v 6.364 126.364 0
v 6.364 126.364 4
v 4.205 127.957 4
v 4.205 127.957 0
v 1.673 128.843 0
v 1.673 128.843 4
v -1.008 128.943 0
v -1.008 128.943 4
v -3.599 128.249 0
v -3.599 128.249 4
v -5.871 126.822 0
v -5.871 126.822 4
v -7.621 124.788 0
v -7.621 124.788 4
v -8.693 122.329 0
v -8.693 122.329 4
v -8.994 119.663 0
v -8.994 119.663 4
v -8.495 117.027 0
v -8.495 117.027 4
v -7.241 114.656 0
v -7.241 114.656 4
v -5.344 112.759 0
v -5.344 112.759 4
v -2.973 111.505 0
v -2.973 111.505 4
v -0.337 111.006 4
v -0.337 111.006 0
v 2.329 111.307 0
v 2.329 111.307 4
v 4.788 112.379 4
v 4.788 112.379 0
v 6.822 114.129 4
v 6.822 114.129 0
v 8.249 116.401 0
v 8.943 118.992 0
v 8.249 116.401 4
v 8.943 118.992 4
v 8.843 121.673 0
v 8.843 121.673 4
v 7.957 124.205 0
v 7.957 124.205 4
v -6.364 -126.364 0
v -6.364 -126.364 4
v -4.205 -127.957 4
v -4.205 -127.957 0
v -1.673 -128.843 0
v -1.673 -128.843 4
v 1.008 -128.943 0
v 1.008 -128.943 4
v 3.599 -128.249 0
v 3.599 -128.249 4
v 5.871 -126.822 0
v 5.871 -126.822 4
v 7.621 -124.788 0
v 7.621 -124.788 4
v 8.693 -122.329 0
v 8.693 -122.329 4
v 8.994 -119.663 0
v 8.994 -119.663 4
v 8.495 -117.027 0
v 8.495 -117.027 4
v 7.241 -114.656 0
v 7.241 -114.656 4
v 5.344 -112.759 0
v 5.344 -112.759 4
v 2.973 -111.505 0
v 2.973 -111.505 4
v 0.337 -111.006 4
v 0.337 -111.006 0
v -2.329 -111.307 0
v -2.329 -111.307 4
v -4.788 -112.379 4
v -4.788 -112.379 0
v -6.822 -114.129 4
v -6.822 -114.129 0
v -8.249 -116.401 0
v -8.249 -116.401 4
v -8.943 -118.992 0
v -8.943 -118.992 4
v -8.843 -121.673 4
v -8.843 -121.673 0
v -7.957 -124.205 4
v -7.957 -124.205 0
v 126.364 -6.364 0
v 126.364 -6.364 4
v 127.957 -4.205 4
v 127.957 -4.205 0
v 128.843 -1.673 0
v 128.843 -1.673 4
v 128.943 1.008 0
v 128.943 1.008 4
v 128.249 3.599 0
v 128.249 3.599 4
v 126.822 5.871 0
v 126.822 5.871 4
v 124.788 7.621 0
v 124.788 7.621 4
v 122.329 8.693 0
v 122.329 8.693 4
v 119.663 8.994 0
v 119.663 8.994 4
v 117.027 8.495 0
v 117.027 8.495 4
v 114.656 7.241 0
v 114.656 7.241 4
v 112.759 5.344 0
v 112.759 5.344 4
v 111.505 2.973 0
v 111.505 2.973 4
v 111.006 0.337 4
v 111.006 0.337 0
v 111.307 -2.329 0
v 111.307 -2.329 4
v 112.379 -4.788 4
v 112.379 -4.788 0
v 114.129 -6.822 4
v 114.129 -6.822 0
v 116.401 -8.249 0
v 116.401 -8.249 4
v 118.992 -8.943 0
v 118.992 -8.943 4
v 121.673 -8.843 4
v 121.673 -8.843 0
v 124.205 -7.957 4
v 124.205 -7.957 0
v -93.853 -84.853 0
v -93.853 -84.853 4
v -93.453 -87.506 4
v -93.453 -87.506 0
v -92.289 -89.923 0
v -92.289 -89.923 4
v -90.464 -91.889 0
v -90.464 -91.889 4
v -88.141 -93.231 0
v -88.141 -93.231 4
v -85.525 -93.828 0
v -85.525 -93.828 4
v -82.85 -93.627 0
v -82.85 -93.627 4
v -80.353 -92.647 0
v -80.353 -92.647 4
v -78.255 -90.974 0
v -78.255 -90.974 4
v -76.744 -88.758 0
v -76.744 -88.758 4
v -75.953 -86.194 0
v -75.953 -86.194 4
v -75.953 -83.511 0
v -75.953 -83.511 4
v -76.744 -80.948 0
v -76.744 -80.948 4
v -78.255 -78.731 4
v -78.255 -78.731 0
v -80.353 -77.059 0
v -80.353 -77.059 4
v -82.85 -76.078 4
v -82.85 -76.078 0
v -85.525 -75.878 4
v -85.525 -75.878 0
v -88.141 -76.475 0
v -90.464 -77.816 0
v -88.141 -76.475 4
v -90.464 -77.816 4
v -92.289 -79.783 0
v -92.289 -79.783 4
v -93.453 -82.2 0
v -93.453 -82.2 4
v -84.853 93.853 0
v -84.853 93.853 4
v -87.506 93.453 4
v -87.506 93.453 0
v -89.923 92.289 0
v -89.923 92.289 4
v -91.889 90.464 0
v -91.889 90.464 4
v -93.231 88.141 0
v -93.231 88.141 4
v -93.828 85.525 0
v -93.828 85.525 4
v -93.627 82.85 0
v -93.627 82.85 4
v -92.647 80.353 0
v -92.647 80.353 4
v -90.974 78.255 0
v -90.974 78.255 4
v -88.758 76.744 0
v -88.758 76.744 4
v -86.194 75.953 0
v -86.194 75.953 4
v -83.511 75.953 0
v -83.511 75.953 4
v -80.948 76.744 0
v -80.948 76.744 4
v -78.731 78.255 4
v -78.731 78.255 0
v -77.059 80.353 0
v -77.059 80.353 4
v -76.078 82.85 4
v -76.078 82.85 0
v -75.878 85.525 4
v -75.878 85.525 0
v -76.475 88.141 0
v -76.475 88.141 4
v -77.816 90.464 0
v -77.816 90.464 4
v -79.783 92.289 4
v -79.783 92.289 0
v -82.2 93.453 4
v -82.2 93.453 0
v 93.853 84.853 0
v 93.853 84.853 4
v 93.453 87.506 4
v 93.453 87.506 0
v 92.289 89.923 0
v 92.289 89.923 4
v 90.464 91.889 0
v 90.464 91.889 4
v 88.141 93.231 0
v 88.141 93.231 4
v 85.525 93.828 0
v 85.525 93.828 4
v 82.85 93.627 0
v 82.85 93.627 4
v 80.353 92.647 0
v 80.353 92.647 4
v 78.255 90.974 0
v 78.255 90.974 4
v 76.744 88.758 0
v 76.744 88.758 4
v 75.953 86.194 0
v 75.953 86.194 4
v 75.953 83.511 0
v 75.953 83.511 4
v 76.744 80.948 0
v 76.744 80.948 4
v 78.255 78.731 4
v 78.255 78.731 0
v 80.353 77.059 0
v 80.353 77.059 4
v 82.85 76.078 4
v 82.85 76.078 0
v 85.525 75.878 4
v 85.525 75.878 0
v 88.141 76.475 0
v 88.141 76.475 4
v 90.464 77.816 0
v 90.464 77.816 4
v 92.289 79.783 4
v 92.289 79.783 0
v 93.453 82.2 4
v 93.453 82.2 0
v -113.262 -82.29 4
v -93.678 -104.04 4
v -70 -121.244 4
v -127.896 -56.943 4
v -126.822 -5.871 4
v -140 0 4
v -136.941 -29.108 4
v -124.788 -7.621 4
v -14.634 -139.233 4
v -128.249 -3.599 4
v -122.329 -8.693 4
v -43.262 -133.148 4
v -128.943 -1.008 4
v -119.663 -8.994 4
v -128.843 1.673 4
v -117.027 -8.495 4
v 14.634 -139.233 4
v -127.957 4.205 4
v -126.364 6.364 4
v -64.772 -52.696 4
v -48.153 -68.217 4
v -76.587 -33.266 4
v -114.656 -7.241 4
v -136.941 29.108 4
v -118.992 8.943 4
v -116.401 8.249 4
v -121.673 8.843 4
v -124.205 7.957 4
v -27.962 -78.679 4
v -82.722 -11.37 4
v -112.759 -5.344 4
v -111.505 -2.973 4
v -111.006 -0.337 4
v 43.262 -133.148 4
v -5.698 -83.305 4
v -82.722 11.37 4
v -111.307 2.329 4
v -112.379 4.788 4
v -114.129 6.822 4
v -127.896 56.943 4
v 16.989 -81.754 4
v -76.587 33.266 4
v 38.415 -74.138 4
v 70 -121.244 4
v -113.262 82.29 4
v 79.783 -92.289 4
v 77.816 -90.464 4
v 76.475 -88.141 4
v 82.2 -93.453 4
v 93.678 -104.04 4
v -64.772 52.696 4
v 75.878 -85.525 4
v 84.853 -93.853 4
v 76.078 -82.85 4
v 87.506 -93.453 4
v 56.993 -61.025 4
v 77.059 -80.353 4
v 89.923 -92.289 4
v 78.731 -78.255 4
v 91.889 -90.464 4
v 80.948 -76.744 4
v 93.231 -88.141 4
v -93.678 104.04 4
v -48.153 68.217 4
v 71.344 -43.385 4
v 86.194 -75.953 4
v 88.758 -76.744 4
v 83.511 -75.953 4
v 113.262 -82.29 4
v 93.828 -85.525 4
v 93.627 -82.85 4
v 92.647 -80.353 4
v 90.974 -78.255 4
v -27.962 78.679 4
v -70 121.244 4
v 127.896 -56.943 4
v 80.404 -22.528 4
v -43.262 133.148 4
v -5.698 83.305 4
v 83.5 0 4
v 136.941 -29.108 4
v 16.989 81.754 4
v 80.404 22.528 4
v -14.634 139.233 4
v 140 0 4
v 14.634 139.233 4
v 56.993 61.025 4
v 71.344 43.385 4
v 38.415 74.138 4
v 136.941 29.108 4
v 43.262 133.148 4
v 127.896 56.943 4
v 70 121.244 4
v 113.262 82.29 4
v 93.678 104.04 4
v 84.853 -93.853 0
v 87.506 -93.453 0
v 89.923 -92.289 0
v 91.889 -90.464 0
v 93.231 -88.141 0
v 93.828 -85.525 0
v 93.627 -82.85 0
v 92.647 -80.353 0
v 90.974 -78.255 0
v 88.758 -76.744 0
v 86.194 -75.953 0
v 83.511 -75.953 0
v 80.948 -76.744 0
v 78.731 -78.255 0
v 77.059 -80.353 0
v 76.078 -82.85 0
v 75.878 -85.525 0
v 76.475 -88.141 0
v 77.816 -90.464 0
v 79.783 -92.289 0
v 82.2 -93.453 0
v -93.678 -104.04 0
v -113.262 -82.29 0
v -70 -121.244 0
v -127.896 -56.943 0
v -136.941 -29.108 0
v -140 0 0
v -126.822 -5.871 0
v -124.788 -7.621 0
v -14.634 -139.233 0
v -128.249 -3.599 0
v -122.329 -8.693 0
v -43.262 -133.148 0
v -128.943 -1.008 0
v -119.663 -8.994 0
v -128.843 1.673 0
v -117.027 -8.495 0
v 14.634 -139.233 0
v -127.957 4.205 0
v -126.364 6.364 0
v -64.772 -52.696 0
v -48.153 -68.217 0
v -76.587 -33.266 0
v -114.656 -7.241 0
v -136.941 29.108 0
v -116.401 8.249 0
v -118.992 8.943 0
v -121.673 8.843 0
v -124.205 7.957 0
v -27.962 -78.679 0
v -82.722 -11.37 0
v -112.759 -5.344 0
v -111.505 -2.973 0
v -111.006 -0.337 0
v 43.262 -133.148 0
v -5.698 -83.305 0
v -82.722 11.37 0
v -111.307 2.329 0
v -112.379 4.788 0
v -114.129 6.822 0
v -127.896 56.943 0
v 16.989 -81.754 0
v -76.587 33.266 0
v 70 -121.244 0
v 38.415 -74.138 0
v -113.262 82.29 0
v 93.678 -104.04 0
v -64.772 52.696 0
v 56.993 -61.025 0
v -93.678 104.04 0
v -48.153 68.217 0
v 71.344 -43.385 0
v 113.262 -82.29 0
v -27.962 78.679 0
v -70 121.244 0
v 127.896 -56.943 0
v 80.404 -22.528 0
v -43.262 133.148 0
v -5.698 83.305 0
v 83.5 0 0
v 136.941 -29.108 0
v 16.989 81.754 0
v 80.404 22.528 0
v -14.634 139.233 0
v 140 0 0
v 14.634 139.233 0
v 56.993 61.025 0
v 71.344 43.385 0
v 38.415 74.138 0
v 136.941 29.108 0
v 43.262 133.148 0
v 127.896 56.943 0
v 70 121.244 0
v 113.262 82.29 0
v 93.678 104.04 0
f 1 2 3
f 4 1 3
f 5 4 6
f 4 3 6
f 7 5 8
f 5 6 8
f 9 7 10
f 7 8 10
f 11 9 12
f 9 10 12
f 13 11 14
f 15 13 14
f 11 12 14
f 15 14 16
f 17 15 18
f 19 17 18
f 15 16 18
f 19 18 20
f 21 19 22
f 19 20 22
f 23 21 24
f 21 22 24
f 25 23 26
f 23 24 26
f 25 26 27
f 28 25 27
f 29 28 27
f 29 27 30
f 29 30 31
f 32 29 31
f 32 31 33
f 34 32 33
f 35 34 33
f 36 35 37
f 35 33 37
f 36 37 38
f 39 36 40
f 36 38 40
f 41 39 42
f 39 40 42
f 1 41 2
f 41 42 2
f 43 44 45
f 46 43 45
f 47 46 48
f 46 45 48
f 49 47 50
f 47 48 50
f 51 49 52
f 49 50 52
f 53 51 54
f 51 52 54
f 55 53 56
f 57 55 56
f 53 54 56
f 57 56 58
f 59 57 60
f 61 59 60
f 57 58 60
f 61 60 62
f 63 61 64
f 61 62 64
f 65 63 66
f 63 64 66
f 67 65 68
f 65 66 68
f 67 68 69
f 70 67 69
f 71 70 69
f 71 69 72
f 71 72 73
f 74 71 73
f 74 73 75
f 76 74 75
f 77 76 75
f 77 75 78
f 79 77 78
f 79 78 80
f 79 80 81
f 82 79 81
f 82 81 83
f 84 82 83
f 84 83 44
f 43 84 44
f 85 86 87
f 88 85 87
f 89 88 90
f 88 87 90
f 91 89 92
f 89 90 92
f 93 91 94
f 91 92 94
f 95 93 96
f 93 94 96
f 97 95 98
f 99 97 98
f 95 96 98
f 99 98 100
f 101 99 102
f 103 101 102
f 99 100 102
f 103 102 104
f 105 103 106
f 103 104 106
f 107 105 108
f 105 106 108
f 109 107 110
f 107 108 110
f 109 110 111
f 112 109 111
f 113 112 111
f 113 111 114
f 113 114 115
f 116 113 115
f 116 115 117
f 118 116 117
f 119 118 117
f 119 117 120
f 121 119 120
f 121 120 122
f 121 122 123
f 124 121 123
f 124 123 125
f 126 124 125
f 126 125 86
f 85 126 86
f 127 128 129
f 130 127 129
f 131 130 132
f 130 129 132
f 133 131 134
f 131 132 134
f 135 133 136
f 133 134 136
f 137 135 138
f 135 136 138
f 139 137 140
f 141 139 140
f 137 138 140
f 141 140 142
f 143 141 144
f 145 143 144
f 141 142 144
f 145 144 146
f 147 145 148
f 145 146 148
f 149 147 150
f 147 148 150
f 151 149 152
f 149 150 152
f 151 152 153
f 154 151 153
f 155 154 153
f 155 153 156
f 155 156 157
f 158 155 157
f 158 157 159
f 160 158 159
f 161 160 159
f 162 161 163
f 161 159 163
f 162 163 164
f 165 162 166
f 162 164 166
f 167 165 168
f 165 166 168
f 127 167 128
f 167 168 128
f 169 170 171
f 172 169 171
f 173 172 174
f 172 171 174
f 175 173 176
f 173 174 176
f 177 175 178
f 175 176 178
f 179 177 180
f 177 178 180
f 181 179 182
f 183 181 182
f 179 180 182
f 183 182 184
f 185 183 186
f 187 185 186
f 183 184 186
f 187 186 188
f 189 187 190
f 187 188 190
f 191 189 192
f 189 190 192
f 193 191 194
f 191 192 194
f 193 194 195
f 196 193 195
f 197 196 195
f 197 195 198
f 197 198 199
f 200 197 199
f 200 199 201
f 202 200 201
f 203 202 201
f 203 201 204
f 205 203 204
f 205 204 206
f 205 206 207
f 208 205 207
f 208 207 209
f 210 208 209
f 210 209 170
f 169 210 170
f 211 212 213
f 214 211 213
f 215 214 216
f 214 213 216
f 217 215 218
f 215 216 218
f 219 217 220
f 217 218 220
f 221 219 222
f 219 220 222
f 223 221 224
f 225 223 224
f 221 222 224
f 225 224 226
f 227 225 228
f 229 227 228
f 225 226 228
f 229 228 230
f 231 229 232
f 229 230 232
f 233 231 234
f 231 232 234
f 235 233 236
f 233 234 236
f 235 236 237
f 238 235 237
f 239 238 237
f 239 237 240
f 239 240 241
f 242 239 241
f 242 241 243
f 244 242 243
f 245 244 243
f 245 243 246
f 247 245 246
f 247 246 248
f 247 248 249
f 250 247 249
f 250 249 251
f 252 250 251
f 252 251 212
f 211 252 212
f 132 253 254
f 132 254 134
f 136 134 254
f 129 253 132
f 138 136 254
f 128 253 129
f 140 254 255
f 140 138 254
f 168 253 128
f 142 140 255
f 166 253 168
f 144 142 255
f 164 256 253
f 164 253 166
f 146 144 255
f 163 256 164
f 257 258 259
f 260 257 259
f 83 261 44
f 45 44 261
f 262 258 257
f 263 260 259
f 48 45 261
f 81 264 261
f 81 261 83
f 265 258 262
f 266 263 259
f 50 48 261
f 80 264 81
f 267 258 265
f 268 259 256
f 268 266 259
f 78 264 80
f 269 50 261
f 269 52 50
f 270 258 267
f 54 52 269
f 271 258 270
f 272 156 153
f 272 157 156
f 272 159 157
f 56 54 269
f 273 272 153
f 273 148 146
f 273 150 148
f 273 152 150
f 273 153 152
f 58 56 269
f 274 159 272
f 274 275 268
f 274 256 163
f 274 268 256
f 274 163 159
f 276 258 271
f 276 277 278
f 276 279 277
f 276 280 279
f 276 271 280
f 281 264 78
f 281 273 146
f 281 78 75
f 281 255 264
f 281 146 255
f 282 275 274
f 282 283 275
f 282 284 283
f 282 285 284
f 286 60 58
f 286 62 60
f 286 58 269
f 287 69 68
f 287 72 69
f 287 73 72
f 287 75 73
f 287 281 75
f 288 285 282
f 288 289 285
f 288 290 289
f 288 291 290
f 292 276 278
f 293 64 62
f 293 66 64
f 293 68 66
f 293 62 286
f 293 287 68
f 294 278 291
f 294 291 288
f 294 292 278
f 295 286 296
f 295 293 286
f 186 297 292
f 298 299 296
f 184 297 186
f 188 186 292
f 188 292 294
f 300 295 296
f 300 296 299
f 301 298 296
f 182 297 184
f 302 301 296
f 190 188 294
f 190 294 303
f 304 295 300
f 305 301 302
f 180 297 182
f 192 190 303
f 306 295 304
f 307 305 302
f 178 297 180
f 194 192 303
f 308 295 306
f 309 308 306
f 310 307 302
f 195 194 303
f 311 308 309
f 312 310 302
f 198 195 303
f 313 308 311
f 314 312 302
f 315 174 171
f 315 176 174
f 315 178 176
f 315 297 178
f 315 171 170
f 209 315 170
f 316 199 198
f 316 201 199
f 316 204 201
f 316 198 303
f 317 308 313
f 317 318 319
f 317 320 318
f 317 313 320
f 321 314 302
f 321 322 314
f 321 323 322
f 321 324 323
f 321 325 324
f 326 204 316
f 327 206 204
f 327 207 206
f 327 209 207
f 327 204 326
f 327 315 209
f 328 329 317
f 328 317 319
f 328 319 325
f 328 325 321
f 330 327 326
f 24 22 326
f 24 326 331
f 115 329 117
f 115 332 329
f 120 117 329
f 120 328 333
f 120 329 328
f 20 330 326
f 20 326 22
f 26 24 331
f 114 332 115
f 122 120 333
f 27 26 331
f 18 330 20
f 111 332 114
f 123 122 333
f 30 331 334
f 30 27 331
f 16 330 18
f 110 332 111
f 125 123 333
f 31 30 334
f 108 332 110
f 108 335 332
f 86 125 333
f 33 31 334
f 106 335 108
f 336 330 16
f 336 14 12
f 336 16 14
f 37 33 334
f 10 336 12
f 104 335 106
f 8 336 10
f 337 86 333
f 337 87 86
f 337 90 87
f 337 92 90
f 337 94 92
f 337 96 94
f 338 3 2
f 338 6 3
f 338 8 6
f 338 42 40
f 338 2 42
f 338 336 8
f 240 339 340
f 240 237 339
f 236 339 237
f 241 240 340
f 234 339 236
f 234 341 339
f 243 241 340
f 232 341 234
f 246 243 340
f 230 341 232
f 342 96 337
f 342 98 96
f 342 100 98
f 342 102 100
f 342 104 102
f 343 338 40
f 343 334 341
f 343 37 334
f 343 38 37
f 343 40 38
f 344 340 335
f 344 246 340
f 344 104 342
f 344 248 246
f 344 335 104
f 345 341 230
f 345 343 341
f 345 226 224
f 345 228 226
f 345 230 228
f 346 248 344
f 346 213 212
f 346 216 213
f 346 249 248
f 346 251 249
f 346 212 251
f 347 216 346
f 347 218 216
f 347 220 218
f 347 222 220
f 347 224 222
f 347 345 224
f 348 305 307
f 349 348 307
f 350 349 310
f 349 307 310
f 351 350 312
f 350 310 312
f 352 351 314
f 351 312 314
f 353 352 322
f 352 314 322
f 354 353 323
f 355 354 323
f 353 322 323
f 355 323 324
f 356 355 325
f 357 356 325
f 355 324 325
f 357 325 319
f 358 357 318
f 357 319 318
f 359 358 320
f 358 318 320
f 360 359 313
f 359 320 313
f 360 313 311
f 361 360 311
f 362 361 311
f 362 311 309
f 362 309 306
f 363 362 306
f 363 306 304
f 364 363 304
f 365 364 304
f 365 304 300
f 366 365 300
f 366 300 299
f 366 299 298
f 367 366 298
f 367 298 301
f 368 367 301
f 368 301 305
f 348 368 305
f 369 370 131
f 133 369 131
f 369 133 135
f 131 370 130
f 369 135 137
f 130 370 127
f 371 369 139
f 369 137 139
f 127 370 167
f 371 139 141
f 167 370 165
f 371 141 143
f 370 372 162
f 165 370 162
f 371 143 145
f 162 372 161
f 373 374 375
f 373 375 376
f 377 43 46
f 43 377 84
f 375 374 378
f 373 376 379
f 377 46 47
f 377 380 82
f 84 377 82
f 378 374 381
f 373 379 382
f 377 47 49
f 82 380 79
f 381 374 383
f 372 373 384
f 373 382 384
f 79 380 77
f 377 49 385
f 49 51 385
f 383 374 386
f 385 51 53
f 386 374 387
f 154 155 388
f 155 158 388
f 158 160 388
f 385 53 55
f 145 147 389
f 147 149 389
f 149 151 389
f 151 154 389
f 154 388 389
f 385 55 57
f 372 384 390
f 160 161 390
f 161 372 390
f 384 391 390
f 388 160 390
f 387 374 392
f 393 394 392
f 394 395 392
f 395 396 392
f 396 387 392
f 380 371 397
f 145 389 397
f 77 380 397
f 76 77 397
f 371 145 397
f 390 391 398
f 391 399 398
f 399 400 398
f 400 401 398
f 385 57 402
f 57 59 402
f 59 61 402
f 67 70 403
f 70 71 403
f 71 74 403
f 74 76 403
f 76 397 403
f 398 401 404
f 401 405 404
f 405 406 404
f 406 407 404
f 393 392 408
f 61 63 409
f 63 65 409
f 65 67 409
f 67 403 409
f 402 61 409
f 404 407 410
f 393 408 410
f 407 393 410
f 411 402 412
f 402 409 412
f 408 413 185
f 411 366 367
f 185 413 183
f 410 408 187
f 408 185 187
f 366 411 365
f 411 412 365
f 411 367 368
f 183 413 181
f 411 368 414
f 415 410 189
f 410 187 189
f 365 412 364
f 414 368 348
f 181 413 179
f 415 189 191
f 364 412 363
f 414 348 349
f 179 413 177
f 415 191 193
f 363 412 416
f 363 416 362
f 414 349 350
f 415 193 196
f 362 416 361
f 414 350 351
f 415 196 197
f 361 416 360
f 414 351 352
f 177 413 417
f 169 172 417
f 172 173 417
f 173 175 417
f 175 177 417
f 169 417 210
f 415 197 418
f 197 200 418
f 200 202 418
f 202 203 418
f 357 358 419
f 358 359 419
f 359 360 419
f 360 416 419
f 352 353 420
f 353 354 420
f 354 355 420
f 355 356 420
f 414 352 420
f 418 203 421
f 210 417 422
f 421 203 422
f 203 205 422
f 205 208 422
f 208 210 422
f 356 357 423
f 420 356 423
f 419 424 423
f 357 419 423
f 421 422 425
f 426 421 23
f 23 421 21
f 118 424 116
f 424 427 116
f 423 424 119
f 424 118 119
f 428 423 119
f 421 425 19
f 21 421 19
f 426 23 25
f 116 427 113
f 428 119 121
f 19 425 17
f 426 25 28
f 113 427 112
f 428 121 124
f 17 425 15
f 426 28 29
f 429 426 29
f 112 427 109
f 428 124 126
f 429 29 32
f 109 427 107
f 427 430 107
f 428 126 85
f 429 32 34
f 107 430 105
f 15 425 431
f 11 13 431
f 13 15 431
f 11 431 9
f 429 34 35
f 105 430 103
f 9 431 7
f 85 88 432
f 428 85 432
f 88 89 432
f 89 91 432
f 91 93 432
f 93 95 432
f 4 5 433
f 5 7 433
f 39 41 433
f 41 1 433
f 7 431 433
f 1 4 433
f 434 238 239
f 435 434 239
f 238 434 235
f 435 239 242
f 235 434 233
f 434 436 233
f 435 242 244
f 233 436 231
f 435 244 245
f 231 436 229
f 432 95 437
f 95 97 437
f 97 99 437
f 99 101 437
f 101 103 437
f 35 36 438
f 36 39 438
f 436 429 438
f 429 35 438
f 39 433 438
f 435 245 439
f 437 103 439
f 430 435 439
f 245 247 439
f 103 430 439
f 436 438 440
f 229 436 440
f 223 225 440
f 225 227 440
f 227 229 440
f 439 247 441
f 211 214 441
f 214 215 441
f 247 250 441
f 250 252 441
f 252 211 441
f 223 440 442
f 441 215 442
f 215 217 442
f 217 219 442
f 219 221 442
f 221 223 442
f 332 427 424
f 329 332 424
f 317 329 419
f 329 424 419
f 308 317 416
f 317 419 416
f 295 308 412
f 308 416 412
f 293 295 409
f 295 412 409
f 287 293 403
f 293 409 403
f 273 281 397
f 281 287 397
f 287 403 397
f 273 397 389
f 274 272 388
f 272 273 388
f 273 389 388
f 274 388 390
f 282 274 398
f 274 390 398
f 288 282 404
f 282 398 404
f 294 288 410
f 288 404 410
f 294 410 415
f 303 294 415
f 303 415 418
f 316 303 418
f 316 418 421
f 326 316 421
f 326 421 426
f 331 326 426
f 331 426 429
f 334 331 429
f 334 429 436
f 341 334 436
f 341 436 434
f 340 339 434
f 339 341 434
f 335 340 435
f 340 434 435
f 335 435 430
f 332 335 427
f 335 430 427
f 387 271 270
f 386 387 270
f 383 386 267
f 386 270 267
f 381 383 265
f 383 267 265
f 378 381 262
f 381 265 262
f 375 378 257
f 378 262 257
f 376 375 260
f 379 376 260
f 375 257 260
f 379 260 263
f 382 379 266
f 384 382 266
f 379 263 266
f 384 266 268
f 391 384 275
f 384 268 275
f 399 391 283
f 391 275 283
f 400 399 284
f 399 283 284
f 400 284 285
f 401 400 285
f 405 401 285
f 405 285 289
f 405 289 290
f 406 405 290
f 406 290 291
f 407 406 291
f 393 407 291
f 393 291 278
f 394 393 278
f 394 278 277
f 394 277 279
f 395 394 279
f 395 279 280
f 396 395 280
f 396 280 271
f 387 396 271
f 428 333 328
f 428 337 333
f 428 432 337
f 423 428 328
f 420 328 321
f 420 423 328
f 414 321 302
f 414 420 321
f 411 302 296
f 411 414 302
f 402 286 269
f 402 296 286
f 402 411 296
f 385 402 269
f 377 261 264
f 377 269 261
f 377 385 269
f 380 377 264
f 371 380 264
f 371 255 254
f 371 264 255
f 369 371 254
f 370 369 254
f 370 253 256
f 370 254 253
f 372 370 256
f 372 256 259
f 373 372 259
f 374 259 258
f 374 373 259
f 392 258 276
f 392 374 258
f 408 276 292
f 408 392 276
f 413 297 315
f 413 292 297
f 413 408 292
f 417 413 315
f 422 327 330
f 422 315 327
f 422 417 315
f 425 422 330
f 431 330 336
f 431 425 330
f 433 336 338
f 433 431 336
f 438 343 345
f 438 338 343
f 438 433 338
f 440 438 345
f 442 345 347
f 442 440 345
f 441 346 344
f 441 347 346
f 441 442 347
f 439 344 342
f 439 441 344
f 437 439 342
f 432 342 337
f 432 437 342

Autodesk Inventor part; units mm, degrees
ref_plane "YZ Plane" through (0, 0, 0) normal (1, 0, 0) x (0, 1, 0)
ref_plane "XZ Plane" through (0, 0, 0) normal (0, 1, 0) x (-1, 0, 0)
ref_plane "XY Plane" through (0, 0, 0) normal (0, 0, 1) x (1, 0, 0)
sketch "Sketch1" plane through (0, 0, 0) normal (0, 0, 1) x (1, 0, 0)
  circle A0 centre (0, 0) radius 83.5
  circle A1 centre (0, 0) radius 140
  dimension "d22" = 167
  dimension "d23" = 280
extrude "Plate1" add sketch "Sketch1" along normal blind 4
sketch "Sketch5" plane through (0, 0, 4) normal (0, 0, 1) x (1, 0, 0)
  circle A0 centre (84.8528, 84.8528) radius 9
  circle A1 centre (0, 0) radius 120 construction
  line L0 (84.8528, 84.8528) -> (0, 0) construction
  line L1 (0, 0) -> (0, 120) construction
  dimension "d24" = 18
  dimension "d25" = 240
  dimension "d31" = 45
extrude "Cut1" cut sketch "Sketch5" against normal blind 4
pattern_circular "Circular Pattern1" count 8 over 360 about axis through (0, 0, 0) along (0, 0, 1) of "Cut1"
equation "\"d22\" = Flange_Tube_diam"
equation "\"d23\" = Flange_D_outer"
equation "\"d24\" = Flange_d_hole_diam"
equation "\"d25\" = Flange_D1_hole_center"
equation "\"d26\" = Thickness"
equation "\"d2\" = Thickness"
equation "\"BendReliefWidth\" = Thickness"
equation "\"BendReliefDepth\" = 0.5 * Thickness"
equation "\"CornerReliefSize\" = 4 * Thickness"
equation "\"MinimumRemnant\" = 2 * Thickness"
equation "\"TransitionRadius\" = BendRadius"
equation "\"JacobiRadiusSize\" = BendRadius"
equation "\"GapSize\" = Thickness"
equation "\"Flange_D_outer\" = 280"
equation "\"Flange_D1_hole_center\" = 240"
equation "\"Flange_d_hole_diam\" = 18"
equation "\"Flange_Tube_diam\" = 167"
equation "\"Thickness\" = 4"
equation "\"BendRadius\" = 6"
properties part number "drain flange" material "Stainless Steel"
